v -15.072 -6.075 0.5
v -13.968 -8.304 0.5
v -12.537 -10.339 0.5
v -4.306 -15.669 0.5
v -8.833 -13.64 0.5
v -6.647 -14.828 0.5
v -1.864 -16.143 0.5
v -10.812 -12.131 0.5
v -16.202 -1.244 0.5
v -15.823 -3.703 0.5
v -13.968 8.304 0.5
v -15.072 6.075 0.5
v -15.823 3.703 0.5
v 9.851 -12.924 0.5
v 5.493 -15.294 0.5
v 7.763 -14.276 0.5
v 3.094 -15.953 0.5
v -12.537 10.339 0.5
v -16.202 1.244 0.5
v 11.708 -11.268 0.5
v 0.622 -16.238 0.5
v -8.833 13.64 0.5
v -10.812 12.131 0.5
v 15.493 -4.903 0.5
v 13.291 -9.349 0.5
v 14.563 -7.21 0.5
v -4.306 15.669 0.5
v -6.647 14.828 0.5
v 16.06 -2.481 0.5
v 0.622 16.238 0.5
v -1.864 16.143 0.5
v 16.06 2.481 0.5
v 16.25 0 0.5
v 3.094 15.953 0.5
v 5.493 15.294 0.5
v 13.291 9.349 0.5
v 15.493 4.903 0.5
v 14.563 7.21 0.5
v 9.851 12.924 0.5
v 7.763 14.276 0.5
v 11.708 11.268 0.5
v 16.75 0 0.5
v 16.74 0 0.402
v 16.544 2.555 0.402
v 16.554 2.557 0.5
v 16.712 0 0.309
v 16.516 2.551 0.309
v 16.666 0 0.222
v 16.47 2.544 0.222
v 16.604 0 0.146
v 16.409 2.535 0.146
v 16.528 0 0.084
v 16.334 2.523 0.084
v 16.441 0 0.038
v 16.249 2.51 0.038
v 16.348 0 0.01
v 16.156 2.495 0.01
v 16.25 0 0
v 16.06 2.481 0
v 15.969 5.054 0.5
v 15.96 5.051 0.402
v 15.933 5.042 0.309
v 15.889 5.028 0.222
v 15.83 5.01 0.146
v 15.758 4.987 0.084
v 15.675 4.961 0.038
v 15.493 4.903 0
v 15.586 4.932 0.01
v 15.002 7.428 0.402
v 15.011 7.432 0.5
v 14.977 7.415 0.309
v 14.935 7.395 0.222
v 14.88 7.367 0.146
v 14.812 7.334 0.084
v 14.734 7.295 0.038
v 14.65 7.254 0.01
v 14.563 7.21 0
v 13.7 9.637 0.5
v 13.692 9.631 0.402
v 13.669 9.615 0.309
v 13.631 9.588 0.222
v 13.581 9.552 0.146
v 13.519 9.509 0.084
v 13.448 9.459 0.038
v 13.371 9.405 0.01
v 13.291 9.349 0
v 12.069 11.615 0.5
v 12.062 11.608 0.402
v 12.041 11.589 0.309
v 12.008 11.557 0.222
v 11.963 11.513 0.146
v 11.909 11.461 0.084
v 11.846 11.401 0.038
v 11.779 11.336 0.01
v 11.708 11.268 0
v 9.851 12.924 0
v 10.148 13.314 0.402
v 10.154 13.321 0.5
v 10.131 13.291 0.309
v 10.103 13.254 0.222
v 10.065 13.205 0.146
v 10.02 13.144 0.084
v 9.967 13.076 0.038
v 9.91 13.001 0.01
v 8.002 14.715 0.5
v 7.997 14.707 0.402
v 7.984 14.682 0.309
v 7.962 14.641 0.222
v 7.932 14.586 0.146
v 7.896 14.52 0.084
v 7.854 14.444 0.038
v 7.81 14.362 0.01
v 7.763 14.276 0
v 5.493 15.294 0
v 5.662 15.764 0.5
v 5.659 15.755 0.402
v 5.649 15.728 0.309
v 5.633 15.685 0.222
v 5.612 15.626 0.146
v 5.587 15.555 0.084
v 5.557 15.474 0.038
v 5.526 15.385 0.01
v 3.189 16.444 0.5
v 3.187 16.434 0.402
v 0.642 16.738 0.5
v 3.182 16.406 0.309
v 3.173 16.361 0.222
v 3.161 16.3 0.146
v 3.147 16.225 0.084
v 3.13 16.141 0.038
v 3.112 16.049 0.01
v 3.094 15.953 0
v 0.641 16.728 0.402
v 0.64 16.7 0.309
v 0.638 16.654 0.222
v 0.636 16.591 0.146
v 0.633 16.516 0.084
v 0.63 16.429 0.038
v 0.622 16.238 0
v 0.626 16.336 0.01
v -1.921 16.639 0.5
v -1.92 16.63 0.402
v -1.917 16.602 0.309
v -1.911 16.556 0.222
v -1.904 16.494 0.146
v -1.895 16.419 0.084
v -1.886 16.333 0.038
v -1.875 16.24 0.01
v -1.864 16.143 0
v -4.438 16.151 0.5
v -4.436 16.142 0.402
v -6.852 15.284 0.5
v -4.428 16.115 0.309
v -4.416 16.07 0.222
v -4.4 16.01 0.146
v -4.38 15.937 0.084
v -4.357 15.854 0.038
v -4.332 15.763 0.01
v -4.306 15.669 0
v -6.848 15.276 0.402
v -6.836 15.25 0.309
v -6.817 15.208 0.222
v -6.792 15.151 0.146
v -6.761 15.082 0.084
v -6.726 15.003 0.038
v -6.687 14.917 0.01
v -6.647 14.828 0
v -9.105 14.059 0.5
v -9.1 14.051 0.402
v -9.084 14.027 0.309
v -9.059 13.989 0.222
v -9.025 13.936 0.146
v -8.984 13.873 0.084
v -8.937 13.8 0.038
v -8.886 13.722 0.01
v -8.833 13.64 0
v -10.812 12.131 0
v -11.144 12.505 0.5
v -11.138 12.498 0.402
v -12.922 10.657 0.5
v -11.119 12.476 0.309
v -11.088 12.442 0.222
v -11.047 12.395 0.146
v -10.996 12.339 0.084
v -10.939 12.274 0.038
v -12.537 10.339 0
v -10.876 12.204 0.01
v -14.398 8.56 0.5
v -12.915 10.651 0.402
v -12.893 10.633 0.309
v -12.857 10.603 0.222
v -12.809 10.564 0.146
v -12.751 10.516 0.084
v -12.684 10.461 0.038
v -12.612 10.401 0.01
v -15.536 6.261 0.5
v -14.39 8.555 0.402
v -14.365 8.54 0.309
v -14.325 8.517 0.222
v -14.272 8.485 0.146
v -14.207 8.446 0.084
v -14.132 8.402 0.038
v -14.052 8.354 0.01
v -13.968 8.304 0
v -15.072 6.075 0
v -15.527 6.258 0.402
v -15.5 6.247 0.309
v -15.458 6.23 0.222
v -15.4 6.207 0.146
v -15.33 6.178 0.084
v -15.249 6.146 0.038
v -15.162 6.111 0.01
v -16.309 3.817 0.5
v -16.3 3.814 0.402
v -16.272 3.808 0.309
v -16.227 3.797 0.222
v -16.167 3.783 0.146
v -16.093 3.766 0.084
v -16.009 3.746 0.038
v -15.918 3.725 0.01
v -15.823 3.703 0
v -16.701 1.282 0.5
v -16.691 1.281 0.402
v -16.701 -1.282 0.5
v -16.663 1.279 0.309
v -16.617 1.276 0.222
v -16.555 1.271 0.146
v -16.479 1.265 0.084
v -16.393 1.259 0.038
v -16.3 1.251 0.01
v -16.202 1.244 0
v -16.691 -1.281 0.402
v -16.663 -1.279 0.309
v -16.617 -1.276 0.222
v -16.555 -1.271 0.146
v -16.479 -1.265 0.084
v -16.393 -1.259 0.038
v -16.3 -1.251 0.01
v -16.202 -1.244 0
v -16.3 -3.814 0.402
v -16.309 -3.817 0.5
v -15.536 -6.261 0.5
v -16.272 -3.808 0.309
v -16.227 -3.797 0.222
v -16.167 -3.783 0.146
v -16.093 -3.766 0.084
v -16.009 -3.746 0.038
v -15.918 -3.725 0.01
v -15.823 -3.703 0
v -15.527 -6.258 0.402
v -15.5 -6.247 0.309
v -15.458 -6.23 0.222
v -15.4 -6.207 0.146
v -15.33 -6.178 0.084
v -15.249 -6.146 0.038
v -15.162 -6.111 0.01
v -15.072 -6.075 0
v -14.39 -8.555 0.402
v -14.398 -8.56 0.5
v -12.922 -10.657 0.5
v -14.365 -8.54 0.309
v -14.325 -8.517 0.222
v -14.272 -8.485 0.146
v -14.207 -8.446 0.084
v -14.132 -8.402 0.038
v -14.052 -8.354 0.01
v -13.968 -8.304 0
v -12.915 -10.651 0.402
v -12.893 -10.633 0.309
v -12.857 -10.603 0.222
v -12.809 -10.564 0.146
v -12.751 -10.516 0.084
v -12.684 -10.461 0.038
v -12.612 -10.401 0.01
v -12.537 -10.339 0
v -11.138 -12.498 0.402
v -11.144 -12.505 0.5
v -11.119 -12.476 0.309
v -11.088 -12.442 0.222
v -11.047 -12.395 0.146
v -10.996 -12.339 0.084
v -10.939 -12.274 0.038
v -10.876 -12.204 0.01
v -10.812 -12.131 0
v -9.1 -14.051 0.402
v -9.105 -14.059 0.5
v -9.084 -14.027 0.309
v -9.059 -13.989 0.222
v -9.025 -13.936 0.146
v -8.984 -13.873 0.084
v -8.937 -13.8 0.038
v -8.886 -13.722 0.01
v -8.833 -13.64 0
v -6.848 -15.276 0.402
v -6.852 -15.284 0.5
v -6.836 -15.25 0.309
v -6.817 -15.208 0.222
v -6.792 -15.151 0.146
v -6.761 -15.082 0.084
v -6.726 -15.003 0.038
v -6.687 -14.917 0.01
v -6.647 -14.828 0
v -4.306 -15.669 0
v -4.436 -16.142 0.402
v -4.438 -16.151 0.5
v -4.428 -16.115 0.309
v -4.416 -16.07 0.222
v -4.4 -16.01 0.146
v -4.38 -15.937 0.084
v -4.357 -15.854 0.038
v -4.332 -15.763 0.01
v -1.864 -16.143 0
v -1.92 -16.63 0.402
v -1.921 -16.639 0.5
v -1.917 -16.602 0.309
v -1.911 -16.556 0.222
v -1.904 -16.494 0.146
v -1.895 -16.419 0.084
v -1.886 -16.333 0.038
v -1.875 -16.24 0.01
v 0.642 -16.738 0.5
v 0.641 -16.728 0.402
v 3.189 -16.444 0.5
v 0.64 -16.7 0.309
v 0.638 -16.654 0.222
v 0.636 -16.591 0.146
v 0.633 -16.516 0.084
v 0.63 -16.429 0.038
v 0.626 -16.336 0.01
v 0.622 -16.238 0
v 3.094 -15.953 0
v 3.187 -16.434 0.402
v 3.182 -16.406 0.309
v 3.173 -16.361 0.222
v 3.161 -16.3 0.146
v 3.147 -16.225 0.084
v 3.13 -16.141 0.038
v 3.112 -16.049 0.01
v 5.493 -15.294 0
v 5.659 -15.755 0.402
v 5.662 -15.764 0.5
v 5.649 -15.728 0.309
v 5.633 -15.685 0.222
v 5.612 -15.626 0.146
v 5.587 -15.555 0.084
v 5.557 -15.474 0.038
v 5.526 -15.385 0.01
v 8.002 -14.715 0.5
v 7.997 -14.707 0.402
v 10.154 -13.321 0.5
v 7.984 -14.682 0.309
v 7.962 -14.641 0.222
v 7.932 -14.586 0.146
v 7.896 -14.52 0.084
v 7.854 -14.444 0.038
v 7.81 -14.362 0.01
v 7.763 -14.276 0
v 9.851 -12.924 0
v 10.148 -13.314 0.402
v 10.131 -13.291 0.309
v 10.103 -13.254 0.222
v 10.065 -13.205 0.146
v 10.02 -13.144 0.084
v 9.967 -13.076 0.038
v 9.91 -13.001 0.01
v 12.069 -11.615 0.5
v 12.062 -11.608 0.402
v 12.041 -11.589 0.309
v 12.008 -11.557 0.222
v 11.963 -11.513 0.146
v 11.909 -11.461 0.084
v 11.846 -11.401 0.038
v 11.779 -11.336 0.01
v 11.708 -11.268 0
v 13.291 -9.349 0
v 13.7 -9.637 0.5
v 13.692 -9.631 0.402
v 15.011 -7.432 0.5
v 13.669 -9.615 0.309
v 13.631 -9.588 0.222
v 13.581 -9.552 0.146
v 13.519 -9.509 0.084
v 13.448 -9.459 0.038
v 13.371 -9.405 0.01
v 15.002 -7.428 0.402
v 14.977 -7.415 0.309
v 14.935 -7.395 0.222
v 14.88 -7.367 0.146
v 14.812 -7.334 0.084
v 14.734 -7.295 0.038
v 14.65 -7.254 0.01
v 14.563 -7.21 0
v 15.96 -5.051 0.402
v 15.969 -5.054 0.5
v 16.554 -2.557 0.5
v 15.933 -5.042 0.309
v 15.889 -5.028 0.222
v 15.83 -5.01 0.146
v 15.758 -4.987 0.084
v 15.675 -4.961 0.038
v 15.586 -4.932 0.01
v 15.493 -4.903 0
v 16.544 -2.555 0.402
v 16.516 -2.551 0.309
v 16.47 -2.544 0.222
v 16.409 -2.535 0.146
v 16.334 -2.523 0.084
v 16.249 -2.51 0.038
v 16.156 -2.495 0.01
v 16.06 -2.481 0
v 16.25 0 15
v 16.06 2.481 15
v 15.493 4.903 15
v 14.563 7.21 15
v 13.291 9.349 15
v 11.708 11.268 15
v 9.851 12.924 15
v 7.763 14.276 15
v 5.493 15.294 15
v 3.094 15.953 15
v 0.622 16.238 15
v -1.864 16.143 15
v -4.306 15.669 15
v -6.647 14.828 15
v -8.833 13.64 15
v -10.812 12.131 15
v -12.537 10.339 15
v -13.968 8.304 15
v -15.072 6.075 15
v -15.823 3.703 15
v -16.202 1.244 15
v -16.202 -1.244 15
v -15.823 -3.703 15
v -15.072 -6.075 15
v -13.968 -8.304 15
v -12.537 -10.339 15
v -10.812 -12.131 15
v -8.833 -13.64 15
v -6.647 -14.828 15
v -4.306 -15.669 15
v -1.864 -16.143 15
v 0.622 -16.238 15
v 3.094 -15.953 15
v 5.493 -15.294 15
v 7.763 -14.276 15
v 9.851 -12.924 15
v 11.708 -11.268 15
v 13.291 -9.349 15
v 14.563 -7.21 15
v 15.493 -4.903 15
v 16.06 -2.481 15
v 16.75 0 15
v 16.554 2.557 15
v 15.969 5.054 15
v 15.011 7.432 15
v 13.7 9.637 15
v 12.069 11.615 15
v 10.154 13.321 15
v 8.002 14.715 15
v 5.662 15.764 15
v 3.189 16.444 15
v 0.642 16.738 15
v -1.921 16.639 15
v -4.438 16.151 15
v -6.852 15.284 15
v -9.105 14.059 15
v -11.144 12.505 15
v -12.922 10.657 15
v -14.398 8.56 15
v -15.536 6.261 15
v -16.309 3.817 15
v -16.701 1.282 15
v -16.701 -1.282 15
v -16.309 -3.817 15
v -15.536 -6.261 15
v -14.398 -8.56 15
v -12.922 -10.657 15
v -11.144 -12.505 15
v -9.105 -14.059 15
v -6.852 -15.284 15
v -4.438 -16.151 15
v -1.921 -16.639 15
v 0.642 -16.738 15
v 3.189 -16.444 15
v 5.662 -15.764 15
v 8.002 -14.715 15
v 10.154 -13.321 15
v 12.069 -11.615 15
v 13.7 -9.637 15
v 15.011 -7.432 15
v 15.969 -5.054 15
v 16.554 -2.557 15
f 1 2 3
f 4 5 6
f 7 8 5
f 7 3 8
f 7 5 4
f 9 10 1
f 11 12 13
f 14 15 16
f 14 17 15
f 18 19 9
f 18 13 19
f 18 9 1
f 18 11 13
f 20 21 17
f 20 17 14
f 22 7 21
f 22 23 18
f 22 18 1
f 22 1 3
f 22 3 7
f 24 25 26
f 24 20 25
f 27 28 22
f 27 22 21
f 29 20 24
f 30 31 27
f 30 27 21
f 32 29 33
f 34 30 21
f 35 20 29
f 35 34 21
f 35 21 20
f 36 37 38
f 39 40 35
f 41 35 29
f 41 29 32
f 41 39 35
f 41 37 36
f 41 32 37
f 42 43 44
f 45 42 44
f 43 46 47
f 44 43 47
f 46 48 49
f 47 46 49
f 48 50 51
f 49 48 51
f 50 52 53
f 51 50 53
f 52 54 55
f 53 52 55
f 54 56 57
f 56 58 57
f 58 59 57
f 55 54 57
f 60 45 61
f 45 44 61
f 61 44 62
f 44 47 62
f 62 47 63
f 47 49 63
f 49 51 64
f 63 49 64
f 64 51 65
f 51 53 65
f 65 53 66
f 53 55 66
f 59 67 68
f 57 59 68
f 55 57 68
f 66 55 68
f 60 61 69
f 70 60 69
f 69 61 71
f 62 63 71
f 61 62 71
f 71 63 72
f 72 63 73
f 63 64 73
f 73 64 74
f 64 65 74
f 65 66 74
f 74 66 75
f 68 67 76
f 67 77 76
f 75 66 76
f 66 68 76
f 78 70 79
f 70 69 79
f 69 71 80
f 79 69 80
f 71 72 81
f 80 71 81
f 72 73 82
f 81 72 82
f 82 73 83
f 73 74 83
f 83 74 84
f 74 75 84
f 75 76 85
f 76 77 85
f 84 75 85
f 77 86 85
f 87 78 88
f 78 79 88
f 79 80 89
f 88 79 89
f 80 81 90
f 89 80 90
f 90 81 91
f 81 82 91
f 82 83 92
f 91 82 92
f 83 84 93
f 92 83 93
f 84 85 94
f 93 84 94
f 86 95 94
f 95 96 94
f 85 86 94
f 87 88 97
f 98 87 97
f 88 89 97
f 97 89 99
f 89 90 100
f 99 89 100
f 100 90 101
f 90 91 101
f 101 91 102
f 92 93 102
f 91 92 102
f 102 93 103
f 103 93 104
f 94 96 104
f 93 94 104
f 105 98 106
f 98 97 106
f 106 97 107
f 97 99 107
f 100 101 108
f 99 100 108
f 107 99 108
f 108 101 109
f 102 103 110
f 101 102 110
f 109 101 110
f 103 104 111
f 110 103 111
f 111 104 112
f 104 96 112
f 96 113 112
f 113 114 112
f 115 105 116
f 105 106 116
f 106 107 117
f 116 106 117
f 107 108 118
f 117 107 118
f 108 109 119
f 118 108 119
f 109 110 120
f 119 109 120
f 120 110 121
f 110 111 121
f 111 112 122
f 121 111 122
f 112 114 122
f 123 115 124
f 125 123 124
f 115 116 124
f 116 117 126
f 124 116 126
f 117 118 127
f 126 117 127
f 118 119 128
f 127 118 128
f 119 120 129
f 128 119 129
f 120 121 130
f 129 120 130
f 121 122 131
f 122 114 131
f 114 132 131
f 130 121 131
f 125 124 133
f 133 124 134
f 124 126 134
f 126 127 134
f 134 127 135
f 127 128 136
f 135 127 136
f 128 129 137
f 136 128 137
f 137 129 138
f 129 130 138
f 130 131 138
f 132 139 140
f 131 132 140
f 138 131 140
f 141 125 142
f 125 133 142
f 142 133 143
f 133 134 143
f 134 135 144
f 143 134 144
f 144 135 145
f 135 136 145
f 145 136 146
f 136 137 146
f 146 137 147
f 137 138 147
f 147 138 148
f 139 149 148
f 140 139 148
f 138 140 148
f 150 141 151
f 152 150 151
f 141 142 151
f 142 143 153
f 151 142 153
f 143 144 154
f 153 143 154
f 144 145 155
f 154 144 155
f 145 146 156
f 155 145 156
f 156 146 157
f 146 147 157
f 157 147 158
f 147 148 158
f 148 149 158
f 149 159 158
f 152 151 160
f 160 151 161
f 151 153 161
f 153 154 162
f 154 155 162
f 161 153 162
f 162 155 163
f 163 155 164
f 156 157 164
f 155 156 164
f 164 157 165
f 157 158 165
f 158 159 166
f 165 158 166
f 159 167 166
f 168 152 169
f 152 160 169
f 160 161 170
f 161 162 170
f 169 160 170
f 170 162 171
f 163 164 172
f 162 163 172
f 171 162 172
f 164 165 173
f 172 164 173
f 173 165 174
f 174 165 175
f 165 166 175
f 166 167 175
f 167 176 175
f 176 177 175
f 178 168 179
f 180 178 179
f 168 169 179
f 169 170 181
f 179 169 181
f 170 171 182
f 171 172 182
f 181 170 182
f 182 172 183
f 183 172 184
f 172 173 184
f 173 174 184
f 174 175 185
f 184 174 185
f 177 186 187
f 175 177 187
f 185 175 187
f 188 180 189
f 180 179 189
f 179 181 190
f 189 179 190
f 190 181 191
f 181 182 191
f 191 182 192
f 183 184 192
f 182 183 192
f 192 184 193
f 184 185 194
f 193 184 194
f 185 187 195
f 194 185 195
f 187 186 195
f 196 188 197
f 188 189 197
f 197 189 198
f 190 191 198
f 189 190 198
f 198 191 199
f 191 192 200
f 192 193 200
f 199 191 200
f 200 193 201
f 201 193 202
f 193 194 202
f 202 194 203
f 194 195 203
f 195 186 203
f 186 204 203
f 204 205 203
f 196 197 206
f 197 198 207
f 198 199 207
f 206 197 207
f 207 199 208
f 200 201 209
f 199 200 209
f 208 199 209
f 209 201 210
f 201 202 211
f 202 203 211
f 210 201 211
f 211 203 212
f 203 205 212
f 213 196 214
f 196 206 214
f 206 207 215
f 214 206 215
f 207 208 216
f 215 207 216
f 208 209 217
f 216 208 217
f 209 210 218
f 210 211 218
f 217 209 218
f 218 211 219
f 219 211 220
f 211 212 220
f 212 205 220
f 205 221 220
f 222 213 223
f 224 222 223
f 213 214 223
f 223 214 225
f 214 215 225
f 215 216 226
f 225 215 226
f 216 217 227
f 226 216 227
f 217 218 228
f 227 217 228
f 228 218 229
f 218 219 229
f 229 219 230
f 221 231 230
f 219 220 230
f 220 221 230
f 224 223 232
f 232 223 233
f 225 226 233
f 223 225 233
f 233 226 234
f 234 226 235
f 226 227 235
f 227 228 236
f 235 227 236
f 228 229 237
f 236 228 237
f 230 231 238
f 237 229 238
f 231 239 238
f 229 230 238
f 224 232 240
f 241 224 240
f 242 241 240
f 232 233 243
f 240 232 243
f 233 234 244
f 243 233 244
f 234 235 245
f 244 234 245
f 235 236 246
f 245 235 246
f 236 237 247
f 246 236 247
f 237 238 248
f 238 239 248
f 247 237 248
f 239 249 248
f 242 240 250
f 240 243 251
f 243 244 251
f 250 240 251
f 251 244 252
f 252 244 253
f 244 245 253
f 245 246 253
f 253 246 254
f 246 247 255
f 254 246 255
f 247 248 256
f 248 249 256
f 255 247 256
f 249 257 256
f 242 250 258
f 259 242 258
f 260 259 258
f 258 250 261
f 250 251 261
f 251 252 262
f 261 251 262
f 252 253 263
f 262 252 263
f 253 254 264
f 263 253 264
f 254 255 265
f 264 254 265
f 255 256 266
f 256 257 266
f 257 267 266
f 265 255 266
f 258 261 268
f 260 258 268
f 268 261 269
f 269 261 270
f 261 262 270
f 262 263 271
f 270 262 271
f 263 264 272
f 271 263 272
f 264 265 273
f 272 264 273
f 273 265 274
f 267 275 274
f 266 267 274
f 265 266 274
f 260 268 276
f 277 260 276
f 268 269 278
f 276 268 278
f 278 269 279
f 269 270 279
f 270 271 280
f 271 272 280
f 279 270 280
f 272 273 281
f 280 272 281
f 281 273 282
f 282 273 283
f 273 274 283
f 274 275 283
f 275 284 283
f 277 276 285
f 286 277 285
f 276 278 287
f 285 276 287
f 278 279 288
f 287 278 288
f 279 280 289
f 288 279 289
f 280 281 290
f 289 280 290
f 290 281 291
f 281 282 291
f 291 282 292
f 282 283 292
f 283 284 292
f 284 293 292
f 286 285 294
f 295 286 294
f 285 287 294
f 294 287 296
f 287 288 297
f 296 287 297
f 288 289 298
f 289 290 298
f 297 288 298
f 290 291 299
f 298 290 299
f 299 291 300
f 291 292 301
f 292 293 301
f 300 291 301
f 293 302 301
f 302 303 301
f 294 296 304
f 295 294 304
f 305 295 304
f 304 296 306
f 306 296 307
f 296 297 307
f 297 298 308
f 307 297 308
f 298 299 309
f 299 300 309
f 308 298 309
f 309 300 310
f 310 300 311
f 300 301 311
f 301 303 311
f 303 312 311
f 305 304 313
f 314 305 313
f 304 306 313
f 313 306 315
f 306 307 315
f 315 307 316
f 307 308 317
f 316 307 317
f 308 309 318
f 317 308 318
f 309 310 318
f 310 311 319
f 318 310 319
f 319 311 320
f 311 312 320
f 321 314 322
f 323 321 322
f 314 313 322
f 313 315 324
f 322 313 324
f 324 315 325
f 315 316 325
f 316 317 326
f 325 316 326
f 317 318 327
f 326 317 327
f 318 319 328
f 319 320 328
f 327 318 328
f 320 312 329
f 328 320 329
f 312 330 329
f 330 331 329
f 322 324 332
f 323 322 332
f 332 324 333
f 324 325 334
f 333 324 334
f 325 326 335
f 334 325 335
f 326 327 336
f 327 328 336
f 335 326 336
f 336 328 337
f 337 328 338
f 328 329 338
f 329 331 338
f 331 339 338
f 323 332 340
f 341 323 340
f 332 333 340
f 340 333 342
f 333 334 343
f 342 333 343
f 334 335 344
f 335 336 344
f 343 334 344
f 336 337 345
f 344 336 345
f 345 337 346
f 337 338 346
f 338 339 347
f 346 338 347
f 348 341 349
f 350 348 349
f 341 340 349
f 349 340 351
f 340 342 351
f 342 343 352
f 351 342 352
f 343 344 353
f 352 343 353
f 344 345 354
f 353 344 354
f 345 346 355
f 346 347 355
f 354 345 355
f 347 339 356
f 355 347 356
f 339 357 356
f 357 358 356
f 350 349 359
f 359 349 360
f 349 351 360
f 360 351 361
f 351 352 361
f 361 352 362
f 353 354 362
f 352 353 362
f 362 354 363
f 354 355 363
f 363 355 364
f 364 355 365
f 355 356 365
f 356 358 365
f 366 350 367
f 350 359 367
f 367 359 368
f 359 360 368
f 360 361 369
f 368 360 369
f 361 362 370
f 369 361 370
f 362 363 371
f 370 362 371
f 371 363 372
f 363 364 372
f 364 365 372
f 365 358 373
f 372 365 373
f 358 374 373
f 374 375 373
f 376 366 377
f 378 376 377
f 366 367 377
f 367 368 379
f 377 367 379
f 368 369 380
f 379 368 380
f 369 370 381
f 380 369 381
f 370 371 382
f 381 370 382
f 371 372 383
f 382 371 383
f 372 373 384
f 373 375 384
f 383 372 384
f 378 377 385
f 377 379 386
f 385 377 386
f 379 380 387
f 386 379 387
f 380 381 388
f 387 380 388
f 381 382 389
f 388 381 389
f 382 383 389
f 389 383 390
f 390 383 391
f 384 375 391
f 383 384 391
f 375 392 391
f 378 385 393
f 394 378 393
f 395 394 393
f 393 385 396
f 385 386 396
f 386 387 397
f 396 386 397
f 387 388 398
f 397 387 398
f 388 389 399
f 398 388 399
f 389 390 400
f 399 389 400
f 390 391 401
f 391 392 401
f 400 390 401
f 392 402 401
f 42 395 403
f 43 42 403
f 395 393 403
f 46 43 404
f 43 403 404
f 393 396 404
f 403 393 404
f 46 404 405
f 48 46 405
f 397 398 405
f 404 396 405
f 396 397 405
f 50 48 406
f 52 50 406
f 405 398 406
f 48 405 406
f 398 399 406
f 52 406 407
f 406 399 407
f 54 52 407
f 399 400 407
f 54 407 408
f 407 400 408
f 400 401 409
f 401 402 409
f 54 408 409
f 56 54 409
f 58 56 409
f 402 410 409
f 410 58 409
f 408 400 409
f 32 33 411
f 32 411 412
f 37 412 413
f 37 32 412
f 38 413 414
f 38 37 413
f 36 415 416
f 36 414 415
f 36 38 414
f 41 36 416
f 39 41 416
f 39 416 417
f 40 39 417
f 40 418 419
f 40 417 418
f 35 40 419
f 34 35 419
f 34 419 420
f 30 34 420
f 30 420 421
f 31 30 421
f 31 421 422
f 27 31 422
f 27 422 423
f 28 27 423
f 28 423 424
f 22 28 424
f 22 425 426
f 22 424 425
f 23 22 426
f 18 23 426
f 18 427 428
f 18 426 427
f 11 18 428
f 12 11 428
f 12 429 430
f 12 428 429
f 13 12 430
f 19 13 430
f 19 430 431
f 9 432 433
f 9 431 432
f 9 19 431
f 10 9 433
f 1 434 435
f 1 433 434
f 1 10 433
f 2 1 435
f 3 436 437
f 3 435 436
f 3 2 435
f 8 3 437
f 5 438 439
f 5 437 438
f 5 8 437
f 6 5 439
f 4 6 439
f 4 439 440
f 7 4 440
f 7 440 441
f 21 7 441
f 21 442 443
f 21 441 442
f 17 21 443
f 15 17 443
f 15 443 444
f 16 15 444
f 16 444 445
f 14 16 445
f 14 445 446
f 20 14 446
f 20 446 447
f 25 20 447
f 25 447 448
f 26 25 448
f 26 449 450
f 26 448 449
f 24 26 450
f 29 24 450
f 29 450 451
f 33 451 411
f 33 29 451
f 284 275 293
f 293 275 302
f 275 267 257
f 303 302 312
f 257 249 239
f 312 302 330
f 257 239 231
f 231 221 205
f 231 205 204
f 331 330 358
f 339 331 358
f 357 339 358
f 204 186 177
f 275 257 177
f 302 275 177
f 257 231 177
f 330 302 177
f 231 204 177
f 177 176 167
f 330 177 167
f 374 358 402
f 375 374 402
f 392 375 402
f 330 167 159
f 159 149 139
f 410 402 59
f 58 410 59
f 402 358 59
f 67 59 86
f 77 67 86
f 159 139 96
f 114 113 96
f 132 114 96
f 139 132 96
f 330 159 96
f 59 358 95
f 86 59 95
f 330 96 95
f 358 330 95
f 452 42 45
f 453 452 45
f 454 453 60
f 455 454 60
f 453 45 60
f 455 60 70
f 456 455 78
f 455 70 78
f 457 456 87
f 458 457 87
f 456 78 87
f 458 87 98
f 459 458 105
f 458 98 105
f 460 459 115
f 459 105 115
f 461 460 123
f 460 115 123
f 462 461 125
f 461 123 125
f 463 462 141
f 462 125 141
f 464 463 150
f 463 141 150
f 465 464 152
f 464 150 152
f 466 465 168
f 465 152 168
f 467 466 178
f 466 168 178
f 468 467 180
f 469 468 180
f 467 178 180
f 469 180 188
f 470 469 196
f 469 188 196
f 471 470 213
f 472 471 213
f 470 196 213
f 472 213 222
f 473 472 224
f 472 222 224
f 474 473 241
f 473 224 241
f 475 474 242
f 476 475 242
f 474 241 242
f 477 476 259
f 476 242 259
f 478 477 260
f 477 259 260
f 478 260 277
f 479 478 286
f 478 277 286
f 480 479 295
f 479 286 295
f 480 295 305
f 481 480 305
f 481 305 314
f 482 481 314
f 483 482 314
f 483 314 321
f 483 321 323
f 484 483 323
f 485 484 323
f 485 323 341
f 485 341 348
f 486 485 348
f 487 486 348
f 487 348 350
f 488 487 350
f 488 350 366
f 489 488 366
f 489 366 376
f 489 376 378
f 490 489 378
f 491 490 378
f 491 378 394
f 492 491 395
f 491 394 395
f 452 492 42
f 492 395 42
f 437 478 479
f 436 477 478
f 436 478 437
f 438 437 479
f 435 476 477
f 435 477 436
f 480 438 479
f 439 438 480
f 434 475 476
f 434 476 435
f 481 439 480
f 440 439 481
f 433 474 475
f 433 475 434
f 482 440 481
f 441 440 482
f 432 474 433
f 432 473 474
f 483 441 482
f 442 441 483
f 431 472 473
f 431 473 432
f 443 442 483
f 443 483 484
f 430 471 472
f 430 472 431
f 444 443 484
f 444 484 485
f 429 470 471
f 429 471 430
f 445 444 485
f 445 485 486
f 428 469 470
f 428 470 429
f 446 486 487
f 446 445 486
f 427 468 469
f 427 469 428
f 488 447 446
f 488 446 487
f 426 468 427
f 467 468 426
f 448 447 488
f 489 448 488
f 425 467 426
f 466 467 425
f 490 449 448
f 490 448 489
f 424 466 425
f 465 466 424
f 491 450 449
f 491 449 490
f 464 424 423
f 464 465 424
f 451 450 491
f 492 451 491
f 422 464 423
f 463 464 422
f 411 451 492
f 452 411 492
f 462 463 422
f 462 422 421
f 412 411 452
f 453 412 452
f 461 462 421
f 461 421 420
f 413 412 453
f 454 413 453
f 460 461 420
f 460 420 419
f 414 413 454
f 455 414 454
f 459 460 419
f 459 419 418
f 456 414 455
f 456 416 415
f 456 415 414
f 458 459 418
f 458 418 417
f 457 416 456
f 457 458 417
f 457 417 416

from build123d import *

# Parameters (mm, degrees)
SKETCH1_R           = 16.75
BOSS_EXTRUDE1_DEPTH = 15
SHELL2_T            = -0.5
FILLET1_R           = 0.5


with BuildPart() as part:
    # Sketch1 → Boss-Extrude1 (new body)
    with BuildSketch(Plane.XY):
        Circle(SKETCH1_R)
    extrude(amount=BOSS_EXTRUDE1_DEPTH)

    # Shell2
    shell2_openings = [part.faces().sort_by_distance(p)[0] for p in [
        (0, 0, 15),
    ]]
    offset(amount=SHELL2_T, openings=shell2_openings, kind=Kind.INTERSECTION)

    # Fillet1
    fillet1_edges = [part.edges().sort_by_distance(p)[0] for p in [
        (-16.75, 0, 0),
    ]]
    fillet(fillet1_edges, radius=FILLET1_R)


solid = part.part
